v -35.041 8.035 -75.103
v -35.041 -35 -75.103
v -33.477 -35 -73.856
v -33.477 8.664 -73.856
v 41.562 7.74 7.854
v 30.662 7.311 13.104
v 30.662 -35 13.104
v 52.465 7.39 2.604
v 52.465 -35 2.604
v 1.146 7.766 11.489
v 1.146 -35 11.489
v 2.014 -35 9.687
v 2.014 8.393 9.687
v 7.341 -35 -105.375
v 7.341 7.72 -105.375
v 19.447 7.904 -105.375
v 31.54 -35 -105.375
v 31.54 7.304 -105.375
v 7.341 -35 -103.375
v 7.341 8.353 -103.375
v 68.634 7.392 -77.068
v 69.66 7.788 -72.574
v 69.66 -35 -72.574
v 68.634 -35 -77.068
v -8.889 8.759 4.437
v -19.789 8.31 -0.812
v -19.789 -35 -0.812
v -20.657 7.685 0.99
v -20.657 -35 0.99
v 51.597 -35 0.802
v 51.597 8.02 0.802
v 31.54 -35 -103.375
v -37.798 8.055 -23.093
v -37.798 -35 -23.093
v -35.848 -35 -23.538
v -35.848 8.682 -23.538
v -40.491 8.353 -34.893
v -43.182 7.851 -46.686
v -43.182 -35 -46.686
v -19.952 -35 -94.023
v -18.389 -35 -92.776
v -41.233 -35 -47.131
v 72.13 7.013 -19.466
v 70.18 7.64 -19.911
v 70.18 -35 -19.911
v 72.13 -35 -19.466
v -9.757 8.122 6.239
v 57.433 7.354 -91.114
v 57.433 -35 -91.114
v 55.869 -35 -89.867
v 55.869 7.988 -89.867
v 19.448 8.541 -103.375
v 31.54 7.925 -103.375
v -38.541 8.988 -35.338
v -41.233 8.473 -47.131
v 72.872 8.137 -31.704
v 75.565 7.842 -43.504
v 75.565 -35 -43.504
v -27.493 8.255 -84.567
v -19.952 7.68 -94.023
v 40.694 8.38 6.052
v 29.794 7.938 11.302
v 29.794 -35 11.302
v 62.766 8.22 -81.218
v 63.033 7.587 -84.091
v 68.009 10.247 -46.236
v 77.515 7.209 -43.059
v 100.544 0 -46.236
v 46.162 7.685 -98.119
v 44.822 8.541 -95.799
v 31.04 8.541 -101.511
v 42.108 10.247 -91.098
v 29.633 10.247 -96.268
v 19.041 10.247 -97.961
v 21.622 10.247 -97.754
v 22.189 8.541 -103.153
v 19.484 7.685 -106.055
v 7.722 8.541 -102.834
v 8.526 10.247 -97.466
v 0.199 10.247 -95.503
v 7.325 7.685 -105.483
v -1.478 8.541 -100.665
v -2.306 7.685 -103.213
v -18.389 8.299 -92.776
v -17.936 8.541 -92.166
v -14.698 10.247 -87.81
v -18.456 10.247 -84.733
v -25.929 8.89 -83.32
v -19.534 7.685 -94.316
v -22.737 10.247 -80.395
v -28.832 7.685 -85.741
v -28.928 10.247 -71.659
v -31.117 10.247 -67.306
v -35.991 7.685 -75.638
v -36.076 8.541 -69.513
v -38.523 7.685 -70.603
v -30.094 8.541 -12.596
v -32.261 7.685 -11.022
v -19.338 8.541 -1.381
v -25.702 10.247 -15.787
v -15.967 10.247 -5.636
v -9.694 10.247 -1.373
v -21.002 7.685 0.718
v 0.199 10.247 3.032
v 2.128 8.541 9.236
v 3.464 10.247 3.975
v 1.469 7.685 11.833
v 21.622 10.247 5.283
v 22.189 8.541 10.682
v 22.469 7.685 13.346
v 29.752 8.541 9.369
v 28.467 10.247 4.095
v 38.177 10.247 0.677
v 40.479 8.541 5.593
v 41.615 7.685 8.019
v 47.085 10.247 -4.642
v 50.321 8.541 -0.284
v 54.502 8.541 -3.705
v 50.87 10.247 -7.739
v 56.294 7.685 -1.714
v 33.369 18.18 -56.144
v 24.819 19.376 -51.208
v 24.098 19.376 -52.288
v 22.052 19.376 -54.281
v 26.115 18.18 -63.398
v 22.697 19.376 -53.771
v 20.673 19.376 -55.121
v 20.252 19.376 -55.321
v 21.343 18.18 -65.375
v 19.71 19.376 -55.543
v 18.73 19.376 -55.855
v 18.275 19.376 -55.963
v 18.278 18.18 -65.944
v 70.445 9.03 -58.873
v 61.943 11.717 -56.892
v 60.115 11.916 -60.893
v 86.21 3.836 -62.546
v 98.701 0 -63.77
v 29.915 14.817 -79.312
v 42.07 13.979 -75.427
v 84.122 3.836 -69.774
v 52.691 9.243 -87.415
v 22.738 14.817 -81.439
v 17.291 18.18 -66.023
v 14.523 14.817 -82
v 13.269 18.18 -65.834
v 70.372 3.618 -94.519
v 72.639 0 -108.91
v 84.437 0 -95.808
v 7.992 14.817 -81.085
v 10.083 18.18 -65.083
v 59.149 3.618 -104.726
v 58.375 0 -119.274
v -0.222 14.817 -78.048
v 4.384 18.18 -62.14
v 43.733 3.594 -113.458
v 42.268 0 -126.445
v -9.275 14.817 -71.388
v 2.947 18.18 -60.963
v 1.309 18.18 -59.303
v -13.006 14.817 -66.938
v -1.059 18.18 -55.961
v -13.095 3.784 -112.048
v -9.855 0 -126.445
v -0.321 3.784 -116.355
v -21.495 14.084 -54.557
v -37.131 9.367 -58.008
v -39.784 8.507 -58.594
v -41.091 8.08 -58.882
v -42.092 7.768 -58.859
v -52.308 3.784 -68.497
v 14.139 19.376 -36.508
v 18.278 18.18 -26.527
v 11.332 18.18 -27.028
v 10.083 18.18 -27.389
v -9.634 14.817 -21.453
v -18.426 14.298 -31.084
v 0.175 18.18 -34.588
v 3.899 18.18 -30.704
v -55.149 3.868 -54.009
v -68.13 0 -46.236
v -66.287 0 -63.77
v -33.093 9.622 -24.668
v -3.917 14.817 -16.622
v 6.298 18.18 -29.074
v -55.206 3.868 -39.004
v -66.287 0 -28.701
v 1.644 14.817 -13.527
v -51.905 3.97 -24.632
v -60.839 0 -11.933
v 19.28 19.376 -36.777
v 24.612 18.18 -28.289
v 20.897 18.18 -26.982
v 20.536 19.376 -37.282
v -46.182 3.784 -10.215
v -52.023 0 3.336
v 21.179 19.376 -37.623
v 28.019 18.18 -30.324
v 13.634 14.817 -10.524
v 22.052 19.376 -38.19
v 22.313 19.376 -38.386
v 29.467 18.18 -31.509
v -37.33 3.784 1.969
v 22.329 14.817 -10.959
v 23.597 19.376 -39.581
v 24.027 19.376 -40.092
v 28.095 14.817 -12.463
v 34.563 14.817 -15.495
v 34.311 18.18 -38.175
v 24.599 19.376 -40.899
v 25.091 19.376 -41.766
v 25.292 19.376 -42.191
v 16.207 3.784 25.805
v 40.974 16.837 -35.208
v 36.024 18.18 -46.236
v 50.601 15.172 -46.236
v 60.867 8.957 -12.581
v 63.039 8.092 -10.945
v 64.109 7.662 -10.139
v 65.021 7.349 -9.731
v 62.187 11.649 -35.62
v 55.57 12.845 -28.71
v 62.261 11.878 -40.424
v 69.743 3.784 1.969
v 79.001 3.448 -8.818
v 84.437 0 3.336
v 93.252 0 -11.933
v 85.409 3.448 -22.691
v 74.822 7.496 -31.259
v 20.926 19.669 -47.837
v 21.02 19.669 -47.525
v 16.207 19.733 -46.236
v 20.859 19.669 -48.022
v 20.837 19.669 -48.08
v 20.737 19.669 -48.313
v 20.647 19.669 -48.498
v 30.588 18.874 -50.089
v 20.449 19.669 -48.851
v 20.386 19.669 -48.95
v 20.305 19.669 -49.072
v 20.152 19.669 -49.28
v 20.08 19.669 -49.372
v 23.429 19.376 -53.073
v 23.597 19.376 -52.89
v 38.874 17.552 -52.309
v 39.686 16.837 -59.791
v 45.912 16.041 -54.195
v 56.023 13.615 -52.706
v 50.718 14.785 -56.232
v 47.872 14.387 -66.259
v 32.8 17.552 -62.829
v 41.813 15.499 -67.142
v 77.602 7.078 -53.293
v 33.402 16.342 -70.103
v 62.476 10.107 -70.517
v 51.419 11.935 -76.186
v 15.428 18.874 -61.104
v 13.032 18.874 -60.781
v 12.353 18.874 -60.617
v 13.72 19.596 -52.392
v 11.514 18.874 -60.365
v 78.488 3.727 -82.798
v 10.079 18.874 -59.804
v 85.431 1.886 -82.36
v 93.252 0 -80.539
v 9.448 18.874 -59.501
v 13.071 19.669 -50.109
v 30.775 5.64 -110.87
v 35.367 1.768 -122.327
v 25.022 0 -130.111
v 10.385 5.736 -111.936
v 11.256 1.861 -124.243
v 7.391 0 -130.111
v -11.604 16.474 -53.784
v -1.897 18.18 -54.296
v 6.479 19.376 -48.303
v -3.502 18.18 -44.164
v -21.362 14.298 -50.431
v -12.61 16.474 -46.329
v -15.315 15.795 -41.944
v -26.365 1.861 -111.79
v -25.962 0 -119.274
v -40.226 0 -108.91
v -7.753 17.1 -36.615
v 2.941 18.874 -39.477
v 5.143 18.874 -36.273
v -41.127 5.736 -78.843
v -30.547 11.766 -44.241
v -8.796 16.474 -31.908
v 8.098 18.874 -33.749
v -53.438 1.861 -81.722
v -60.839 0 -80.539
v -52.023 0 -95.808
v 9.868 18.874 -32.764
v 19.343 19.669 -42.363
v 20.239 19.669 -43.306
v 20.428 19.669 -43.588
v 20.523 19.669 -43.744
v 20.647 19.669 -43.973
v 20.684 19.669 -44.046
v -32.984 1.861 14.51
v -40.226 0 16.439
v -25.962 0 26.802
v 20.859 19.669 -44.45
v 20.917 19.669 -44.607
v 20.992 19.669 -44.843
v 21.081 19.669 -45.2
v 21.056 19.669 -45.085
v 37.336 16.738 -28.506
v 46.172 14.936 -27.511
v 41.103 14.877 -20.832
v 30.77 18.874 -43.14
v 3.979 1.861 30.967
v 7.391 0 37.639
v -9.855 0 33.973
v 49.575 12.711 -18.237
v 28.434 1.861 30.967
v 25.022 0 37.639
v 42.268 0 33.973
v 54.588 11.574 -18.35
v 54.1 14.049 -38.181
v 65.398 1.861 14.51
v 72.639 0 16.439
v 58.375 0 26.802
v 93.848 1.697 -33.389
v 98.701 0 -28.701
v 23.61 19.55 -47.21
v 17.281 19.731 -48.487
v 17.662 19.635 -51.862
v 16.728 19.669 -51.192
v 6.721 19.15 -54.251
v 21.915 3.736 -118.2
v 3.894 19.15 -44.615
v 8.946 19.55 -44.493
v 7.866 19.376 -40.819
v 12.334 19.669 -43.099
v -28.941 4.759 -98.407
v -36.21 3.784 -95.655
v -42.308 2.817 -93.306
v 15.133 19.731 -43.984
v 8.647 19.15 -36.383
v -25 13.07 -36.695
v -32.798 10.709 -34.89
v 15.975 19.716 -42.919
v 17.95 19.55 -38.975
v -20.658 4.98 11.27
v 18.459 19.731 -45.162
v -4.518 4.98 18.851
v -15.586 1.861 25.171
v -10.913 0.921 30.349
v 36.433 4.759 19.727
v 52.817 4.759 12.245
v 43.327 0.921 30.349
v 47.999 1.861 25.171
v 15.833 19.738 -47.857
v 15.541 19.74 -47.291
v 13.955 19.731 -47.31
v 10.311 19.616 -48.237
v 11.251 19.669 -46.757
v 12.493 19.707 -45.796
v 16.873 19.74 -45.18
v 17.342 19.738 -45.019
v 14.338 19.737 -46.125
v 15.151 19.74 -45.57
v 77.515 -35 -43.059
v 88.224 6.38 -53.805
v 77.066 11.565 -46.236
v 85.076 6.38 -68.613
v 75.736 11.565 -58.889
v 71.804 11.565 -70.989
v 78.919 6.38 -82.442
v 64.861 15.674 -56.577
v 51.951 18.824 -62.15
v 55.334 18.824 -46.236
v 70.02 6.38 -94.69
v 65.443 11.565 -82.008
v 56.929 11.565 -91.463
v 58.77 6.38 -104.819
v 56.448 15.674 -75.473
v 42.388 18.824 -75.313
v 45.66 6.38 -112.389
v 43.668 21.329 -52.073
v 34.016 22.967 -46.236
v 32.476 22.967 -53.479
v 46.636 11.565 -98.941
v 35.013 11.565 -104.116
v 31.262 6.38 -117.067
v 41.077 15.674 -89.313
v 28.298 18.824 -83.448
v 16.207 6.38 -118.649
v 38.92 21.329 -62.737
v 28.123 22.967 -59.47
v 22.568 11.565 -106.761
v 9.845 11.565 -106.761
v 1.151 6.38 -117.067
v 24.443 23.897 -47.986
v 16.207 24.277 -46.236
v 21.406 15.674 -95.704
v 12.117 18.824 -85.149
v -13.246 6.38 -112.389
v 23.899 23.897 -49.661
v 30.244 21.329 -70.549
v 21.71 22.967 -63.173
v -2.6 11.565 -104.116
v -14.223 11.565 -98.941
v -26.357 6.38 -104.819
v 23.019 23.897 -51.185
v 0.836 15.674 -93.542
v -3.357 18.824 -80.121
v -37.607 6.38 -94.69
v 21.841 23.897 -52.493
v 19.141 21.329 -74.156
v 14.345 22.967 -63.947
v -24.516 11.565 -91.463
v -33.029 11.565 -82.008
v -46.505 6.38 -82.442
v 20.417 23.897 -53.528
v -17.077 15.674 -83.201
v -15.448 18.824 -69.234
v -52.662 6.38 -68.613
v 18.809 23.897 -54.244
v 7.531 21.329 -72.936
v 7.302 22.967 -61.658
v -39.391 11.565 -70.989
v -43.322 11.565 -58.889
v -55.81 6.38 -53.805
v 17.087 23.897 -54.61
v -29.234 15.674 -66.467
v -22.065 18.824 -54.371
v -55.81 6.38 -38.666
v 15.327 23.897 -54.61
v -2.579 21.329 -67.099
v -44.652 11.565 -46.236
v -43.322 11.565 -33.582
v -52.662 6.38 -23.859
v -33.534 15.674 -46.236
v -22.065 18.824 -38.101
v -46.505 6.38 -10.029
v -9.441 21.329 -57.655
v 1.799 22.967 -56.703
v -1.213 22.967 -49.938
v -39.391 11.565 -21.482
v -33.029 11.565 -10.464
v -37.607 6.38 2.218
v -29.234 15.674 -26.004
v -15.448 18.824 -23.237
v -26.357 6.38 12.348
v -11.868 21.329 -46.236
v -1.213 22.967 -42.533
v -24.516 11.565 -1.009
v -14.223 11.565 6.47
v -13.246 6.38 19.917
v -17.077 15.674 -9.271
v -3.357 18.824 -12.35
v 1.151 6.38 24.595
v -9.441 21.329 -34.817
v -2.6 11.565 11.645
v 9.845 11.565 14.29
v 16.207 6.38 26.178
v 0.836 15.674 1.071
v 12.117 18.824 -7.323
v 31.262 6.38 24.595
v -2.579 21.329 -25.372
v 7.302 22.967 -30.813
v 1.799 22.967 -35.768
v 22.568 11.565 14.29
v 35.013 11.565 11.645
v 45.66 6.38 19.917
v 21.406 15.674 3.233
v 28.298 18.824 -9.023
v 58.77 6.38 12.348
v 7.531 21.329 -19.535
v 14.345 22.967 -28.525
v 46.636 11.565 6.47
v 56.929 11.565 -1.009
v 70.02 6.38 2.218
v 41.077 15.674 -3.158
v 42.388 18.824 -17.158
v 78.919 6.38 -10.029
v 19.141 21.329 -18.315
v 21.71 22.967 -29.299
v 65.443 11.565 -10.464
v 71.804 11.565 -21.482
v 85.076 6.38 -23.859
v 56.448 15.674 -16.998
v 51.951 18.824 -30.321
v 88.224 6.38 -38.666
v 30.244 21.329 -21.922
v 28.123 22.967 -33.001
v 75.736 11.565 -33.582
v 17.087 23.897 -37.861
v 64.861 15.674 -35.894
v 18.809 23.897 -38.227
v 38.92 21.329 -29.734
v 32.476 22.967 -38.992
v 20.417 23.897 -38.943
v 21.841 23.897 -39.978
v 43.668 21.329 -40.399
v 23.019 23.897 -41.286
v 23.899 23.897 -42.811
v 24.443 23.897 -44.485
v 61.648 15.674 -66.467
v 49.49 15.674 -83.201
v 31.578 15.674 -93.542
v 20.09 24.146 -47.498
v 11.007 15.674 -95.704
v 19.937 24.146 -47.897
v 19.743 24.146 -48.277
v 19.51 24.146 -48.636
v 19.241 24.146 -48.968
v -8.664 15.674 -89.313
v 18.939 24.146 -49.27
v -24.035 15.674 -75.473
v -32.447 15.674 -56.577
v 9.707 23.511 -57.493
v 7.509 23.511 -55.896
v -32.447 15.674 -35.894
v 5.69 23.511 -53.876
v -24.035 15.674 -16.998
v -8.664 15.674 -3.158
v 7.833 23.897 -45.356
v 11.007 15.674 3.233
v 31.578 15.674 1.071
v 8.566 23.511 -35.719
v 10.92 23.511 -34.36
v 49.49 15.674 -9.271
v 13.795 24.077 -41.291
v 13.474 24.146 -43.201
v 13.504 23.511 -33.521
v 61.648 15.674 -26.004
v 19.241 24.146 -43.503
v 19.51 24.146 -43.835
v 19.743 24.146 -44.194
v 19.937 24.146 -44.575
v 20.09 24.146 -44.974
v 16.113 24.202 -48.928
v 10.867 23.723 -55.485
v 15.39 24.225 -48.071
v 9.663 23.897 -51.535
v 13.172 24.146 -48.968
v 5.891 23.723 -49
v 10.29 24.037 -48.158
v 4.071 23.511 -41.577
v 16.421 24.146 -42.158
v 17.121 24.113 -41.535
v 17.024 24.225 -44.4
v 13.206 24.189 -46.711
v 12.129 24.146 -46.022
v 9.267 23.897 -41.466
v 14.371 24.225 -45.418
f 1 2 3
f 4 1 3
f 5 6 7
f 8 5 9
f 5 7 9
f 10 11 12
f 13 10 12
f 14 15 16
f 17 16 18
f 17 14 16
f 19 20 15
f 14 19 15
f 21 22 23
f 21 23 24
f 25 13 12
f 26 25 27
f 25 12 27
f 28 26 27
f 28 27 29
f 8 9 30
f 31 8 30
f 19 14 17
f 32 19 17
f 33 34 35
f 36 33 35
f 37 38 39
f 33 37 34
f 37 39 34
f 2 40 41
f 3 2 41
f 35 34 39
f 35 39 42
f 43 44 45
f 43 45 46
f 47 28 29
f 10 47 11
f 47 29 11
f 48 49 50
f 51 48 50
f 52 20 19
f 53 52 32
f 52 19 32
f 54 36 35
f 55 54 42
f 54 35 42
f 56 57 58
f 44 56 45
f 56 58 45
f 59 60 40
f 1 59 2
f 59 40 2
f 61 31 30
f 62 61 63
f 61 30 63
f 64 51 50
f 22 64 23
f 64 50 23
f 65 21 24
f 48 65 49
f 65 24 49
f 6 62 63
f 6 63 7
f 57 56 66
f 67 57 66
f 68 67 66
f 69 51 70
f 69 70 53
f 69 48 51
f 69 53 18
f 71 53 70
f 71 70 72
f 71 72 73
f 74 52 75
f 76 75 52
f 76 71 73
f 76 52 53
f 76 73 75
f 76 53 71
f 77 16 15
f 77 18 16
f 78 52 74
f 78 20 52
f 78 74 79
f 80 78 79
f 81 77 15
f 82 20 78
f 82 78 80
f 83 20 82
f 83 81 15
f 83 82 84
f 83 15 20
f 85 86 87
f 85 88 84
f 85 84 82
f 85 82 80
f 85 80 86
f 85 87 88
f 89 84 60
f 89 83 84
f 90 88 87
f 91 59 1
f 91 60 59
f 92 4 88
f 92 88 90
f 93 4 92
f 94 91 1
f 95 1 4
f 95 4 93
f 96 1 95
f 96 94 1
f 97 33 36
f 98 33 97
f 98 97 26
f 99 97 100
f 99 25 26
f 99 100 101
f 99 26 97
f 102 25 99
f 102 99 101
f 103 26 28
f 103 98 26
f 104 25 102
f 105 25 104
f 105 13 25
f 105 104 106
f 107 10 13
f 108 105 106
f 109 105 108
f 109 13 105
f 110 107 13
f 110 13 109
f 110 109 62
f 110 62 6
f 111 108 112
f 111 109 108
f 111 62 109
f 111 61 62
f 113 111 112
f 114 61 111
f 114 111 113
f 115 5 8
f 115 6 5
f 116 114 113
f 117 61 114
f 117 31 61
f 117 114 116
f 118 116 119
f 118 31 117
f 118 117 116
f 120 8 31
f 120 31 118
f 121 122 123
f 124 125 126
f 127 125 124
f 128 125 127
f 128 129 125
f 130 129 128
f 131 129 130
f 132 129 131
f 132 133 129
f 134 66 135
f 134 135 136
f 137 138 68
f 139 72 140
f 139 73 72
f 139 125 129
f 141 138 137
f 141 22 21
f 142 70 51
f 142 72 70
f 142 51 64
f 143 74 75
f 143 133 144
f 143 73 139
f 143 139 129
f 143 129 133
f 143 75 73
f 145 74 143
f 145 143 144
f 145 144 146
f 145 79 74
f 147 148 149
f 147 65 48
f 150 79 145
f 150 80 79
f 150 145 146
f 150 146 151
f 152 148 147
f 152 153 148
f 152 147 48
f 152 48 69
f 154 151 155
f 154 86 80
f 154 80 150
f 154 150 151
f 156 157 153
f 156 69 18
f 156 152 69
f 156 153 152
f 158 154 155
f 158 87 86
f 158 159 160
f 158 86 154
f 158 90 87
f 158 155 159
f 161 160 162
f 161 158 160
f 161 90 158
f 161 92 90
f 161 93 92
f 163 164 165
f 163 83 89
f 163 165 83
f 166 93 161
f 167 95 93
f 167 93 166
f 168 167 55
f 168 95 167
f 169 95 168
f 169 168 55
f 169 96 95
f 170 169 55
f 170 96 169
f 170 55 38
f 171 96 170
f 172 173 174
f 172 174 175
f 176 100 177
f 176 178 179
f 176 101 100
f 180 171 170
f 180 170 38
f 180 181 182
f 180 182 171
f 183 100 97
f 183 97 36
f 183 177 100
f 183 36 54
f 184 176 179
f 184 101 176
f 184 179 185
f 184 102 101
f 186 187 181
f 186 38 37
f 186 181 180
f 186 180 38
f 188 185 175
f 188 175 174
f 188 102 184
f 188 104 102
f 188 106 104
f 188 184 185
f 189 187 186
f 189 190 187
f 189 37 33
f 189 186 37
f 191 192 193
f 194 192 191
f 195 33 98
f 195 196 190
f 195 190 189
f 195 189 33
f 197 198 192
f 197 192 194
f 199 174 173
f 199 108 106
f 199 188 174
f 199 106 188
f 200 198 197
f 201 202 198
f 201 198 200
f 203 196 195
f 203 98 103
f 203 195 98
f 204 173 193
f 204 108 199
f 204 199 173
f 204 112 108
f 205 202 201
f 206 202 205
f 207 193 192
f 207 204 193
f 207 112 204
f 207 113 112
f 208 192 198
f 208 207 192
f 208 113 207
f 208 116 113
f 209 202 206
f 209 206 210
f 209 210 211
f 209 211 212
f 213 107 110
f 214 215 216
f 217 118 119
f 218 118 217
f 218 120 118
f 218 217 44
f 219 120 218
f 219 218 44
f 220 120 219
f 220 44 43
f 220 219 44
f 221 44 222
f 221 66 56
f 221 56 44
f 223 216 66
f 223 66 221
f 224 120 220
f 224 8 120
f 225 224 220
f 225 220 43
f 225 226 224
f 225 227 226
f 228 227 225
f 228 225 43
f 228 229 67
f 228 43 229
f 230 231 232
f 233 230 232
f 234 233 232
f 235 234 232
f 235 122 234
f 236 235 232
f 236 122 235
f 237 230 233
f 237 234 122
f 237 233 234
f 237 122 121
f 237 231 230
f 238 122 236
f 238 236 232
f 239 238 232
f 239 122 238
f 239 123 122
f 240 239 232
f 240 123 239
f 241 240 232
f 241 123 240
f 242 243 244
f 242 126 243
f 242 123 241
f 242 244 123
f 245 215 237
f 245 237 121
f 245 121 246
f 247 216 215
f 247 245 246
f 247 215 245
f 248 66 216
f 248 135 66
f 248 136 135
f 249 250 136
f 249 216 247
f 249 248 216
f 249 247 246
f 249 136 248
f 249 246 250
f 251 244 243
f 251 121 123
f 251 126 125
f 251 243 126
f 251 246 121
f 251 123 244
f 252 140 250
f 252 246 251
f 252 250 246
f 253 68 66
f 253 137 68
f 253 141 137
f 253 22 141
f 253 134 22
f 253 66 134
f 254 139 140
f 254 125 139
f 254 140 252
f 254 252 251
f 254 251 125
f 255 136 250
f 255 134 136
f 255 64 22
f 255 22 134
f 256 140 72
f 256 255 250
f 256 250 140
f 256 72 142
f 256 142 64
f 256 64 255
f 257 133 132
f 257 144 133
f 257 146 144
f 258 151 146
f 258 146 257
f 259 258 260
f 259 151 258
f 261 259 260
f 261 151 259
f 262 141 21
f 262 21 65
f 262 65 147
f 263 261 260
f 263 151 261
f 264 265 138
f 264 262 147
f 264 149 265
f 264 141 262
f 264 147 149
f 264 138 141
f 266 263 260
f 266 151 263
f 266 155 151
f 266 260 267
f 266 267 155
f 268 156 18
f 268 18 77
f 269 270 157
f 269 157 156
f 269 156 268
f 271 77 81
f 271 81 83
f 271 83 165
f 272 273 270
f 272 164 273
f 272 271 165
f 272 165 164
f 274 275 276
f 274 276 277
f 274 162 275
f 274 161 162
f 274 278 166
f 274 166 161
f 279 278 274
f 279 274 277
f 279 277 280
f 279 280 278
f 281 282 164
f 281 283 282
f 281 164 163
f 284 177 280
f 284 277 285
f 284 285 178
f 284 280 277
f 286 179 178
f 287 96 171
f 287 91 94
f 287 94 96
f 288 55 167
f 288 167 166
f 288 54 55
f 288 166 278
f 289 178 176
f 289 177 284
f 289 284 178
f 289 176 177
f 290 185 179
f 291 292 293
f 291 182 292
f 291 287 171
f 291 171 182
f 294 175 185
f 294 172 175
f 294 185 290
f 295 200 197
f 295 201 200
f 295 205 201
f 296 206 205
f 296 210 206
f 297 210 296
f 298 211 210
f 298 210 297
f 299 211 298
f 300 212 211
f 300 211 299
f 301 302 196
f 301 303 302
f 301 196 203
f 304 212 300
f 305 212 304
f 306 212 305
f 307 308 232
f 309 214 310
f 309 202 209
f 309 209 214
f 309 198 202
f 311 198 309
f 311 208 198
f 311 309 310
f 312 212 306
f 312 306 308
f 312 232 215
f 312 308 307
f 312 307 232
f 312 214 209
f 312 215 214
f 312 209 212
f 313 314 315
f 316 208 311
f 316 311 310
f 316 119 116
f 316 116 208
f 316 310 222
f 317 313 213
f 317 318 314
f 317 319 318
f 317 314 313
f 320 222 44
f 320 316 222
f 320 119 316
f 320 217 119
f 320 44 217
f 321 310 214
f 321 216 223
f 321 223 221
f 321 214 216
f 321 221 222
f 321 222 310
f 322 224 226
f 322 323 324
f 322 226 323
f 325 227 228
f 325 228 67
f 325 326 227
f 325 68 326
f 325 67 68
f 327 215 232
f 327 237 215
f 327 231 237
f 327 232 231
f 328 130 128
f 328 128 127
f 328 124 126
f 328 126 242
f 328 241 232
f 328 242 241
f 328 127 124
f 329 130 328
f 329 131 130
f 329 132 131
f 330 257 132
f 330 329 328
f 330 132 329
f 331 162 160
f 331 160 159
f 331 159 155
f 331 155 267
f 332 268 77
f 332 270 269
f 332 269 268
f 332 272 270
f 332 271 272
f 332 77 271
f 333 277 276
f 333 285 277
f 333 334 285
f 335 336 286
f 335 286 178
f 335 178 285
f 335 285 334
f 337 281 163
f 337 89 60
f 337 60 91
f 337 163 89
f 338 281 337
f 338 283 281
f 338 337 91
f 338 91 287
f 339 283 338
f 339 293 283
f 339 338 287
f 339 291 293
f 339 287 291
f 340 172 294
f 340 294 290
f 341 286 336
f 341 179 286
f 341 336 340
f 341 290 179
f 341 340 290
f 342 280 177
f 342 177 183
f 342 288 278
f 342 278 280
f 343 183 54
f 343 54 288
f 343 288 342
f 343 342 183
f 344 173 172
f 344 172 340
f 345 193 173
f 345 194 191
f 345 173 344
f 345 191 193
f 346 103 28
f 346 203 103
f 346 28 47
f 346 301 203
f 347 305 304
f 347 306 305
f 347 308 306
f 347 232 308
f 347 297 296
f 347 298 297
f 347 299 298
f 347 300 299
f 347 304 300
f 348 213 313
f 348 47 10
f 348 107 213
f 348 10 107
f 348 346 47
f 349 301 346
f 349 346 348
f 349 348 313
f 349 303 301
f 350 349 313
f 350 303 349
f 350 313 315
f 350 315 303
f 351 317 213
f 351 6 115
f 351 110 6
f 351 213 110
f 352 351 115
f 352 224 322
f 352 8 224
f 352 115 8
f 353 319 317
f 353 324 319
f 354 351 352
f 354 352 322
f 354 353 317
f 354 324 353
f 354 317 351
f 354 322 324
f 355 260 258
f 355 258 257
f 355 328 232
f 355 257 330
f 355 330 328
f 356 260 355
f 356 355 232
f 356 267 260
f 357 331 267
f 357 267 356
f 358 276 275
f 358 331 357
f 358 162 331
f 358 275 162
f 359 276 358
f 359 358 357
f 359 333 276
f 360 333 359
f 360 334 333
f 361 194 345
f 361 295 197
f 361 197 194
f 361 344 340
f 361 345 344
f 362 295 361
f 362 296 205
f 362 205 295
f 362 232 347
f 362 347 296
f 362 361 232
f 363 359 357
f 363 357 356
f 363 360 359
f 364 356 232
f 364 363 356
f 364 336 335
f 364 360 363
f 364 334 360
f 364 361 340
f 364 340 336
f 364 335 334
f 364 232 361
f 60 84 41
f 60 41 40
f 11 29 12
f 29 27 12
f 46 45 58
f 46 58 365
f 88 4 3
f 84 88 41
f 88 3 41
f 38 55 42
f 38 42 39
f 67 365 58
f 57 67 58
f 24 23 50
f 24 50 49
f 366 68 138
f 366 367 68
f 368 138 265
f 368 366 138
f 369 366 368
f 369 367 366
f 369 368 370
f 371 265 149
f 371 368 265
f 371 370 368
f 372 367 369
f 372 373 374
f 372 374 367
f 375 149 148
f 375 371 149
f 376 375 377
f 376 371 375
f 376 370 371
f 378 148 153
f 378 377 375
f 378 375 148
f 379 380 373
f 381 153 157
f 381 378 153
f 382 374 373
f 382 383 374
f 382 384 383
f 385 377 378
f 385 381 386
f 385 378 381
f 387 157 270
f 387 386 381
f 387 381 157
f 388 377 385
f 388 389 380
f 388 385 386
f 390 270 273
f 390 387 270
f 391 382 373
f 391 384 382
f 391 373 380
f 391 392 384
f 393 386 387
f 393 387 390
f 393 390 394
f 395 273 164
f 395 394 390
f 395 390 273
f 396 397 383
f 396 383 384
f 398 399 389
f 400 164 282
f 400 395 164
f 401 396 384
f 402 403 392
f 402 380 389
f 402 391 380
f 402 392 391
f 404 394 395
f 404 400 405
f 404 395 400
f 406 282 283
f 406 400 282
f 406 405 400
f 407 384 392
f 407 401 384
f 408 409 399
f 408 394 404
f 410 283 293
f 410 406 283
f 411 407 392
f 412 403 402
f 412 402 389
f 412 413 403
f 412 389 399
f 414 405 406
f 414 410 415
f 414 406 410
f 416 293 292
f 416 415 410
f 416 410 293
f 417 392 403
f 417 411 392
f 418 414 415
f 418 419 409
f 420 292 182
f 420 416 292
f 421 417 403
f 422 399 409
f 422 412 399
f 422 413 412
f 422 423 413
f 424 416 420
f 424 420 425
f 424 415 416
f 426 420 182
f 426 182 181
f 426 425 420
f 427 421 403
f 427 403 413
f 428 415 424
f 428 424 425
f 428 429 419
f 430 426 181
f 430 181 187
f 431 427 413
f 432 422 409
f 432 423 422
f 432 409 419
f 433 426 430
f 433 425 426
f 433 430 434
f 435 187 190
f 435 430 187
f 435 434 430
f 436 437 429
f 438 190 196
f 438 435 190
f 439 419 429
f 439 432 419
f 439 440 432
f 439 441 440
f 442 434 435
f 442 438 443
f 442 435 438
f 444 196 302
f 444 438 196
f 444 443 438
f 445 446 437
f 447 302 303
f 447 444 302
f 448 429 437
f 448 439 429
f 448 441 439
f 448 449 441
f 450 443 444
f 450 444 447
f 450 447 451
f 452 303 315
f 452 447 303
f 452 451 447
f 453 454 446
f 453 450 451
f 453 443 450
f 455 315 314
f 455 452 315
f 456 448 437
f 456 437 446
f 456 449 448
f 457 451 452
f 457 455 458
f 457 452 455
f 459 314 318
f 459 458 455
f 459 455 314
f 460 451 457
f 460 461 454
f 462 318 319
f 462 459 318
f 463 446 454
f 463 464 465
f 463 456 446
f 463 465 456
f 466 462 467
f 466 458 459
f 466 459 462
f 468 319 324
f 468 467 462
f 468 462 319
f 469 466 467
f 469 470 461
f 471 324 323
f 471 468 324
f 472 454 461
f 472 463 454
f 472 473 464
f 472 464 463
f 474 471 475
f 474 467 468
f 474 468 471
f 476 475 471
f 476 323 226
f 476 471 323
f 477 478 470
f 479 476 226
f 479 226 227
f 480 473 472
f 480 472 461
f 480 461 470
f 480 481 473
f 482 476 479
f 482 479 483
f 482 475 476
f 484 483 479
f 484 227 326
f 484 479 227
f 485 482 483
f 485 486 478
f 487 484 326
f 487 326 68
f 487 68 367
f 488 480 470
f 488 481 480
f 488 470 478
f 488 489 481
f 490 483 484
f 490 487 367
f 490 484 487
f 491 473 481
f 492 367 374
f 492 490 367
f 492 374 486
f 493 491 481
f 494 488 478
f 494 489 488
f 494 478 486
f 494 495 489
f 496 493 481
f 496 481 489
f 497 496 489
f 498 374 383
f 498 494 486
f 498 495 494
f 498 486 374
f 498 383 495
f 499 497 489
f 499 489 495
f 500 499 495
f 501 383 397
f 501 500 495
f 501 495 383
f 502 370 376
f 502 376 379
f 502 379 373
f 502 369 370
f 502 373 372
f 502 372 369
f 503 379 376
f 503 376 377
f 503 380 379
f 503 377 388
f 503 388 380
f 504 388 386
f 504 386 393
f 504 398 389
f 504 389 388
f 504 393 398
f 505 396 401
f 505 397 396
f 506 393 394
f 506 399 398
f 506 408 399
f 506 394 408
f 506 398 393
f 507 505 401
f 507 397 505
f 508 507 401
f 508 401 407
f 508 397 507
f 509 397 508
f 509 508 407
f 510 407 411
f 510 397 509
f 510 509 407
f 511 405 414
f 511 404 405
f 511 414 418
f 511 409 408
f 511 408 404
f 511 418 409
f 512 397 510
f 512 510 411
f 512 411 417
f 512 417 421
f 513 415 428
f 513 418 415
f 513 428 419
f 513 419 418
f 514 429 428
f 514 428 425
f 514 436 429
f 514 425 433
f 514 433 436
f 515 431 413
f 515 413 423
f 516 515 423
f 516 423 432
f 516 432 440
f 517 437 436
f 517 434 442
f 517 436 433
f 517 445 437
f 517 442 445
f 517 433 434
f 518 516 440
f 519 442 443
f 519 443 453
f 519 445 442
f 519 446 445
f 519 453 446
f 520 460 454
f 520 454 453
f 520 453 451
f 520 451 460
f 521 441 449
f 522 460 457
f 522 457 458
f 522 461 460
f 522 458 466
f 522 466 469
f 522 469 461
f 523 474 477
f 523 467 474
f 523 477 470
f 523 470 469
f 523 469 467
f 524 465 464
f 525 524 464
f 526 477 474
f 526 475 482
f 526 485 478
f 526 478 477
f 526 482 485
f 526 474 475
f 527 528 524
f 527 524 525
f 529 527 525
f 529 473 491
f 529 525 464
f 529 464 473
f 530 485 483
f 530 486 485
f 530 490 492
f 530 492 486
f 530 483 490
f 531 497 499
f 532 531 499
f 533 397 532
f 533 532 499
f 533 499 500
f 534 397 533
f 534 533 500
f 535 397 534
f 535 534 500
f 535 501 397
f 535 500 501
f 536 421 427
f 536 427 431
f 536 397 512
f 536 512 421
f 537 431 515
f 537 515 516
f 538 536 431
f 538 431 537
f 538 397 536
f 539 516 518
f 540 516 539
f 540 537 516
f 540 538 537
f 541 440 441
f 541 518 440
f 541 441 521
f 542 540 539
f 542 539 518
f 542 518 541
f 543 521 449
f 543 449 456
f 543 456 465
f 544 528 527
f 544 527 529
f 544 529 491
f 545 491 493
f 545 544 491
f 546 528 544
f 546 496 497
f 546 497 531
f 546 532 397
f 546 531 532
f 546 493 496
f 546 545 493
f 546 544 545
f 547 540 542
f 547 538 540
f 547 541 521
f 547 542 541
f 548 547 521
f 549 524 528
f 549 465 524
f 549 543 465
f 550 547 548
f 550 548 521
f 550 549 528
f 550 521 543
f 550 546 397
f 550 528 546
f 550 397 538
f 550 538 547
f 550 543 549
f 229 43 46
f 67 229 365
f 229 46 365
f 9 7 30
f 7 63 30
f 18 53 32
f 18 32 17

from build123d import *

# Parameters (mm, degrees)
SKETCH1_W                       = 24.199471414
SKETCH1_H                       = 2
BOSS_EXTRUDE1_DEPTH             = 35
BOSS_EXTRUDE1_DIRECTION_2_REACH = 26.277


with BuildPart() as part:
    # Sketch6 → Revolve3 (revolve)
    with BuildSketch(Plane.XY.offset(-46.235660898)):
        with BuildLine():
            Line((16.206828031, 19.733449427), (16.206828031, 24.27673627))
            add(Edge.make_bspline(
                [(100.543718281, 0), (66.637702737, 19.683925925), (36.295673337, 23.877083975), (16.206828031, 24.27673627)],
                knots=[0, 0, 0, 0, 1, 1, 1, 1], degree=3))
            add(Edge.make_bspline(
                [(16.206828031, 19.733449427), (44.550281864, 20.046720972), (71.658331759, 8.477286849), (100.543718281, 0)],
                knots=[0, 0, 0, 0, 1, 1, 1, 1], degree=3))
        make_face()
    revolve(axis=Axis((16.206828031, 19.733449427, -46.235660898), (0, 1, 0)))

    # Sketch1 → Boss-Extrude1 (add)
    with BuildSketch(Plane(origin=(0, 0, 0), x_dir=(1, 0, 0), z_dir=(0, 1, 0))):
        with Locations((19.440545507, 104.374561644)):
            Rectangle(SKETCH1_W, SKETCH1_H)
        Polygon((68.633841253, 77.067834217), (57.432693736, 91.113628939), (55.869030771, 89.866649335), (69.659558116, 72.573875009), align=None)
        Polygon((72.129937387, 19.465930814), (77.514826367, 43.058670955), (75.564970543, 43.503712823), (70.180081563, 19.910972681), align=None)
        Polygon((30.661981859, -13.103705945), (52.464952222, -2.603948803), (51.597184744, -0.802011068), (29.79421438, -11.301768209), align=None)
        Polygon((-20.656832908, -0.989589169), (1.146137456, -11.48934631), (2.013904934, -9.687408574), (-19.78906543, 0.812348567), align=None)
        Polygon((-43.18239268, 46.686104127), (-37.7975037, 23.093363986), (-35.847647875, 23.538405854), (-41.232536856, 47.131145995), align=None)
        Polygon((-19.952491512, 94.022604484), (-35.040615149, 75.102695874), (-33.476952184, 73.85571627), (-18.388828547, 92.77562488), align=None)
    extrude(amount=-BOSS_EXTRUDE1_DEPTH)

    # Sketch1 → Boss-Extrude1 direction 2 (add, up to next)
    with BuildSketch(Plane(origin=(0, 0, 0), x_dir=(1, 0, 0), z_dir=(0, 1, 0)), mode=Mode.PRIVATE) as boss_extrude1_direction_2_sk1:
        with Locations((19.440545507, 104.374561644)):
            Rectangle(SKETCH1_W, SKETCH1_H)
    boss_extrude1_direction_2_tool1 = extrude(boss_extrude1_direction_2_sk1.sketch, amount=BOSS_EXTRUDE1_DIRECTION_2_REACH, mode=Mode.PRIVATE) - part.part
    add(boss_extrude1_direction_2_tool1.solids().sort_by_distance((19.440546, 0, -104.374562))[0])
    # Sketch1 → Boss-Extrude1 direction 2 (add, up to next)
    with BuildSketch(Plane(origin=(0, 0, 0), x_dir=(1, 0, 0), z_dir=(0, 1, 0)), mode=Mode.PRIVATE) as boss_extrude1_direction_2_sk2:
        Polygon((68.633841253, 77.067834217), (57.432693736, 91.113628939), (55.869030771, 89.866649335), (69.659558116, 72.573875009), align=None)
    boss_extrude1_direction_2_tool2 = extrude(boss_extrude1_direction_2_sk2.sketch, amount=BOSS_EXTRUDE1_DIRECTION_2_REACH, mode=Mode.PRIVATE) - part.part
    add(boss_extrude1_direction_2_tool2.solids().sort_by_distance((62.894136, 0, -82.605929))[0])
    # Sketch1 → Boss-Extrude1 direction 2 (add, up to next)
    with BuildSketch(Plane(origin=(0, 0, 0), x_dir=(1, 0, 0), z_dir=(0, 1, 0)), mode=Mode.PRIVATE) as boss_extrude1_direction_2_sk3:
        Polygon((72.129937387, 19.465930814), (77.514826367, 43.058670955), (75.564970543, 43.503712823), (70.180081563, 19.910972681), align=None)
    boss_extrude1_direction_2_tool3 = extrude(boss_extrude1_direction_2_sk3.sketch, amount=BOSS_EXTRUDE1_DIRECTION_2_REACH, mode=Mode.PRIVATE) - part.part
    add(boss_extrude1_direction_2_tool3.solids().sort_by_distance((73.847454, 0, -31.484822))[0])
    # Sketch1 → Boss-Extrude1 direction 2 (add, up to next)
    with BuildSketch(Plane(origin=(0, 0, 0), x_dir=(1, 0, 0), z_dir=(0, 1, 0)), mode=Mode.PRIVATE) as boss_extrude1_direction_2_sk4:
        Polygon((30.661981859, -13.103705945), (52.464952222, -2.603948803), (51.597184744, -0.802011068), (29.79421438, -11.301768209), align=None)
    boss_extrude1_direction_2_tool4 = extrude(boss_extrude1_direction_2_sk4.sketch, amount=BOSS_EXTRUDE1_DIRECTION_2_REACH, mode=Mode.PRIVATE) - part.part
    add(boss_extrude1_direction_2_tool4.solids().sort_by_distance((41.129583, 0, 6.952859))[0])
    # Sketch1 → Boss-Extrude1 direction 2 (add, up to next)
    with BuildSketch(Plane(origin=(0, 0, 0), x_dir=(1, 0, 0), z_dir=(0, 1, 0)), mode=Mode.PRIVATE) as boss_extrude1_direction_2_sk5:
        Polygon((-20.656832908, -0.989589169), (1.146137456, -11.48934631), (2.013904934, -9.687408574), (-19.78906543, 0.812348567), align=None)
    boss_extrude1_direction_2_tool5 = extrude(boss_extrude1_direction_2_sk5.sketch, amount=BOSS_EXTRUDE1_DIRECTION_2_REACH, mode=Mode.PRIVATE) - part.part
    add(boss_extrude1_direction_2_tool5.solids().sort_by_distance((-9.321464, 0, 5.338499))[0])
    # Sketch1 → Boss-Extrude1 direction 2 (add, up to next)
    with BuildSketch(Plane(origin=(0, 0, 0), x_dir=(1, 0, 0), z_dir=(0, 1, 0)), mode=Mode.PRIVATE) as boss_extrude1_direction_2_sk6:
        Polygon((-43.18239268, 46.686104127), (-37.7975037, 23.093363986), (-35.847647875, 23.538405854), (-41.232536856, 47.131145995), align=None)
    boss_extrude1_direction_2_tool6 = extrude(boss_extrude1_direction_2_sk6.sketch, amount=BOSS_EXTRUDE1_DIRECTION_2_REACH, mode=Mode.PRIVATE) - part.part
    add(boss_extrude1_direction_2_tool6.solids().sort_by_distance((-39.51502, 0, -35.112255))[0])
    # Sketch1 → Boss-Extrude1 direction 2 (add, up to next)
    with BuildSketch(Plane(origin=(0, 0, 0), x_dir=(1, 0, 0), z_dir=(0, 1, 0)), mode=Mode.PRIVATE) as boss_extrude1_direction_2_sk7:
        Polygon((-19.952491512, 94.022604484), (-35.040615149, 75.102695874), (-33.476952184, 73.85571627), (-18.388828547, 92.77562488), align=None)
    boss_extrude1_direction_2_tool7 = extrude(boss_extrude1_direction_2_sk7.sketch, amount=BOSS_EXTRUDE1_DIRECTION_2_REACH, mode=Mode.PRIVATE) - part.part
    add(boss_extrude1_direction_2_tool7.solids().sort_by_distance((-26.714722, 0, -83.93916))[0])


solid = part.part
